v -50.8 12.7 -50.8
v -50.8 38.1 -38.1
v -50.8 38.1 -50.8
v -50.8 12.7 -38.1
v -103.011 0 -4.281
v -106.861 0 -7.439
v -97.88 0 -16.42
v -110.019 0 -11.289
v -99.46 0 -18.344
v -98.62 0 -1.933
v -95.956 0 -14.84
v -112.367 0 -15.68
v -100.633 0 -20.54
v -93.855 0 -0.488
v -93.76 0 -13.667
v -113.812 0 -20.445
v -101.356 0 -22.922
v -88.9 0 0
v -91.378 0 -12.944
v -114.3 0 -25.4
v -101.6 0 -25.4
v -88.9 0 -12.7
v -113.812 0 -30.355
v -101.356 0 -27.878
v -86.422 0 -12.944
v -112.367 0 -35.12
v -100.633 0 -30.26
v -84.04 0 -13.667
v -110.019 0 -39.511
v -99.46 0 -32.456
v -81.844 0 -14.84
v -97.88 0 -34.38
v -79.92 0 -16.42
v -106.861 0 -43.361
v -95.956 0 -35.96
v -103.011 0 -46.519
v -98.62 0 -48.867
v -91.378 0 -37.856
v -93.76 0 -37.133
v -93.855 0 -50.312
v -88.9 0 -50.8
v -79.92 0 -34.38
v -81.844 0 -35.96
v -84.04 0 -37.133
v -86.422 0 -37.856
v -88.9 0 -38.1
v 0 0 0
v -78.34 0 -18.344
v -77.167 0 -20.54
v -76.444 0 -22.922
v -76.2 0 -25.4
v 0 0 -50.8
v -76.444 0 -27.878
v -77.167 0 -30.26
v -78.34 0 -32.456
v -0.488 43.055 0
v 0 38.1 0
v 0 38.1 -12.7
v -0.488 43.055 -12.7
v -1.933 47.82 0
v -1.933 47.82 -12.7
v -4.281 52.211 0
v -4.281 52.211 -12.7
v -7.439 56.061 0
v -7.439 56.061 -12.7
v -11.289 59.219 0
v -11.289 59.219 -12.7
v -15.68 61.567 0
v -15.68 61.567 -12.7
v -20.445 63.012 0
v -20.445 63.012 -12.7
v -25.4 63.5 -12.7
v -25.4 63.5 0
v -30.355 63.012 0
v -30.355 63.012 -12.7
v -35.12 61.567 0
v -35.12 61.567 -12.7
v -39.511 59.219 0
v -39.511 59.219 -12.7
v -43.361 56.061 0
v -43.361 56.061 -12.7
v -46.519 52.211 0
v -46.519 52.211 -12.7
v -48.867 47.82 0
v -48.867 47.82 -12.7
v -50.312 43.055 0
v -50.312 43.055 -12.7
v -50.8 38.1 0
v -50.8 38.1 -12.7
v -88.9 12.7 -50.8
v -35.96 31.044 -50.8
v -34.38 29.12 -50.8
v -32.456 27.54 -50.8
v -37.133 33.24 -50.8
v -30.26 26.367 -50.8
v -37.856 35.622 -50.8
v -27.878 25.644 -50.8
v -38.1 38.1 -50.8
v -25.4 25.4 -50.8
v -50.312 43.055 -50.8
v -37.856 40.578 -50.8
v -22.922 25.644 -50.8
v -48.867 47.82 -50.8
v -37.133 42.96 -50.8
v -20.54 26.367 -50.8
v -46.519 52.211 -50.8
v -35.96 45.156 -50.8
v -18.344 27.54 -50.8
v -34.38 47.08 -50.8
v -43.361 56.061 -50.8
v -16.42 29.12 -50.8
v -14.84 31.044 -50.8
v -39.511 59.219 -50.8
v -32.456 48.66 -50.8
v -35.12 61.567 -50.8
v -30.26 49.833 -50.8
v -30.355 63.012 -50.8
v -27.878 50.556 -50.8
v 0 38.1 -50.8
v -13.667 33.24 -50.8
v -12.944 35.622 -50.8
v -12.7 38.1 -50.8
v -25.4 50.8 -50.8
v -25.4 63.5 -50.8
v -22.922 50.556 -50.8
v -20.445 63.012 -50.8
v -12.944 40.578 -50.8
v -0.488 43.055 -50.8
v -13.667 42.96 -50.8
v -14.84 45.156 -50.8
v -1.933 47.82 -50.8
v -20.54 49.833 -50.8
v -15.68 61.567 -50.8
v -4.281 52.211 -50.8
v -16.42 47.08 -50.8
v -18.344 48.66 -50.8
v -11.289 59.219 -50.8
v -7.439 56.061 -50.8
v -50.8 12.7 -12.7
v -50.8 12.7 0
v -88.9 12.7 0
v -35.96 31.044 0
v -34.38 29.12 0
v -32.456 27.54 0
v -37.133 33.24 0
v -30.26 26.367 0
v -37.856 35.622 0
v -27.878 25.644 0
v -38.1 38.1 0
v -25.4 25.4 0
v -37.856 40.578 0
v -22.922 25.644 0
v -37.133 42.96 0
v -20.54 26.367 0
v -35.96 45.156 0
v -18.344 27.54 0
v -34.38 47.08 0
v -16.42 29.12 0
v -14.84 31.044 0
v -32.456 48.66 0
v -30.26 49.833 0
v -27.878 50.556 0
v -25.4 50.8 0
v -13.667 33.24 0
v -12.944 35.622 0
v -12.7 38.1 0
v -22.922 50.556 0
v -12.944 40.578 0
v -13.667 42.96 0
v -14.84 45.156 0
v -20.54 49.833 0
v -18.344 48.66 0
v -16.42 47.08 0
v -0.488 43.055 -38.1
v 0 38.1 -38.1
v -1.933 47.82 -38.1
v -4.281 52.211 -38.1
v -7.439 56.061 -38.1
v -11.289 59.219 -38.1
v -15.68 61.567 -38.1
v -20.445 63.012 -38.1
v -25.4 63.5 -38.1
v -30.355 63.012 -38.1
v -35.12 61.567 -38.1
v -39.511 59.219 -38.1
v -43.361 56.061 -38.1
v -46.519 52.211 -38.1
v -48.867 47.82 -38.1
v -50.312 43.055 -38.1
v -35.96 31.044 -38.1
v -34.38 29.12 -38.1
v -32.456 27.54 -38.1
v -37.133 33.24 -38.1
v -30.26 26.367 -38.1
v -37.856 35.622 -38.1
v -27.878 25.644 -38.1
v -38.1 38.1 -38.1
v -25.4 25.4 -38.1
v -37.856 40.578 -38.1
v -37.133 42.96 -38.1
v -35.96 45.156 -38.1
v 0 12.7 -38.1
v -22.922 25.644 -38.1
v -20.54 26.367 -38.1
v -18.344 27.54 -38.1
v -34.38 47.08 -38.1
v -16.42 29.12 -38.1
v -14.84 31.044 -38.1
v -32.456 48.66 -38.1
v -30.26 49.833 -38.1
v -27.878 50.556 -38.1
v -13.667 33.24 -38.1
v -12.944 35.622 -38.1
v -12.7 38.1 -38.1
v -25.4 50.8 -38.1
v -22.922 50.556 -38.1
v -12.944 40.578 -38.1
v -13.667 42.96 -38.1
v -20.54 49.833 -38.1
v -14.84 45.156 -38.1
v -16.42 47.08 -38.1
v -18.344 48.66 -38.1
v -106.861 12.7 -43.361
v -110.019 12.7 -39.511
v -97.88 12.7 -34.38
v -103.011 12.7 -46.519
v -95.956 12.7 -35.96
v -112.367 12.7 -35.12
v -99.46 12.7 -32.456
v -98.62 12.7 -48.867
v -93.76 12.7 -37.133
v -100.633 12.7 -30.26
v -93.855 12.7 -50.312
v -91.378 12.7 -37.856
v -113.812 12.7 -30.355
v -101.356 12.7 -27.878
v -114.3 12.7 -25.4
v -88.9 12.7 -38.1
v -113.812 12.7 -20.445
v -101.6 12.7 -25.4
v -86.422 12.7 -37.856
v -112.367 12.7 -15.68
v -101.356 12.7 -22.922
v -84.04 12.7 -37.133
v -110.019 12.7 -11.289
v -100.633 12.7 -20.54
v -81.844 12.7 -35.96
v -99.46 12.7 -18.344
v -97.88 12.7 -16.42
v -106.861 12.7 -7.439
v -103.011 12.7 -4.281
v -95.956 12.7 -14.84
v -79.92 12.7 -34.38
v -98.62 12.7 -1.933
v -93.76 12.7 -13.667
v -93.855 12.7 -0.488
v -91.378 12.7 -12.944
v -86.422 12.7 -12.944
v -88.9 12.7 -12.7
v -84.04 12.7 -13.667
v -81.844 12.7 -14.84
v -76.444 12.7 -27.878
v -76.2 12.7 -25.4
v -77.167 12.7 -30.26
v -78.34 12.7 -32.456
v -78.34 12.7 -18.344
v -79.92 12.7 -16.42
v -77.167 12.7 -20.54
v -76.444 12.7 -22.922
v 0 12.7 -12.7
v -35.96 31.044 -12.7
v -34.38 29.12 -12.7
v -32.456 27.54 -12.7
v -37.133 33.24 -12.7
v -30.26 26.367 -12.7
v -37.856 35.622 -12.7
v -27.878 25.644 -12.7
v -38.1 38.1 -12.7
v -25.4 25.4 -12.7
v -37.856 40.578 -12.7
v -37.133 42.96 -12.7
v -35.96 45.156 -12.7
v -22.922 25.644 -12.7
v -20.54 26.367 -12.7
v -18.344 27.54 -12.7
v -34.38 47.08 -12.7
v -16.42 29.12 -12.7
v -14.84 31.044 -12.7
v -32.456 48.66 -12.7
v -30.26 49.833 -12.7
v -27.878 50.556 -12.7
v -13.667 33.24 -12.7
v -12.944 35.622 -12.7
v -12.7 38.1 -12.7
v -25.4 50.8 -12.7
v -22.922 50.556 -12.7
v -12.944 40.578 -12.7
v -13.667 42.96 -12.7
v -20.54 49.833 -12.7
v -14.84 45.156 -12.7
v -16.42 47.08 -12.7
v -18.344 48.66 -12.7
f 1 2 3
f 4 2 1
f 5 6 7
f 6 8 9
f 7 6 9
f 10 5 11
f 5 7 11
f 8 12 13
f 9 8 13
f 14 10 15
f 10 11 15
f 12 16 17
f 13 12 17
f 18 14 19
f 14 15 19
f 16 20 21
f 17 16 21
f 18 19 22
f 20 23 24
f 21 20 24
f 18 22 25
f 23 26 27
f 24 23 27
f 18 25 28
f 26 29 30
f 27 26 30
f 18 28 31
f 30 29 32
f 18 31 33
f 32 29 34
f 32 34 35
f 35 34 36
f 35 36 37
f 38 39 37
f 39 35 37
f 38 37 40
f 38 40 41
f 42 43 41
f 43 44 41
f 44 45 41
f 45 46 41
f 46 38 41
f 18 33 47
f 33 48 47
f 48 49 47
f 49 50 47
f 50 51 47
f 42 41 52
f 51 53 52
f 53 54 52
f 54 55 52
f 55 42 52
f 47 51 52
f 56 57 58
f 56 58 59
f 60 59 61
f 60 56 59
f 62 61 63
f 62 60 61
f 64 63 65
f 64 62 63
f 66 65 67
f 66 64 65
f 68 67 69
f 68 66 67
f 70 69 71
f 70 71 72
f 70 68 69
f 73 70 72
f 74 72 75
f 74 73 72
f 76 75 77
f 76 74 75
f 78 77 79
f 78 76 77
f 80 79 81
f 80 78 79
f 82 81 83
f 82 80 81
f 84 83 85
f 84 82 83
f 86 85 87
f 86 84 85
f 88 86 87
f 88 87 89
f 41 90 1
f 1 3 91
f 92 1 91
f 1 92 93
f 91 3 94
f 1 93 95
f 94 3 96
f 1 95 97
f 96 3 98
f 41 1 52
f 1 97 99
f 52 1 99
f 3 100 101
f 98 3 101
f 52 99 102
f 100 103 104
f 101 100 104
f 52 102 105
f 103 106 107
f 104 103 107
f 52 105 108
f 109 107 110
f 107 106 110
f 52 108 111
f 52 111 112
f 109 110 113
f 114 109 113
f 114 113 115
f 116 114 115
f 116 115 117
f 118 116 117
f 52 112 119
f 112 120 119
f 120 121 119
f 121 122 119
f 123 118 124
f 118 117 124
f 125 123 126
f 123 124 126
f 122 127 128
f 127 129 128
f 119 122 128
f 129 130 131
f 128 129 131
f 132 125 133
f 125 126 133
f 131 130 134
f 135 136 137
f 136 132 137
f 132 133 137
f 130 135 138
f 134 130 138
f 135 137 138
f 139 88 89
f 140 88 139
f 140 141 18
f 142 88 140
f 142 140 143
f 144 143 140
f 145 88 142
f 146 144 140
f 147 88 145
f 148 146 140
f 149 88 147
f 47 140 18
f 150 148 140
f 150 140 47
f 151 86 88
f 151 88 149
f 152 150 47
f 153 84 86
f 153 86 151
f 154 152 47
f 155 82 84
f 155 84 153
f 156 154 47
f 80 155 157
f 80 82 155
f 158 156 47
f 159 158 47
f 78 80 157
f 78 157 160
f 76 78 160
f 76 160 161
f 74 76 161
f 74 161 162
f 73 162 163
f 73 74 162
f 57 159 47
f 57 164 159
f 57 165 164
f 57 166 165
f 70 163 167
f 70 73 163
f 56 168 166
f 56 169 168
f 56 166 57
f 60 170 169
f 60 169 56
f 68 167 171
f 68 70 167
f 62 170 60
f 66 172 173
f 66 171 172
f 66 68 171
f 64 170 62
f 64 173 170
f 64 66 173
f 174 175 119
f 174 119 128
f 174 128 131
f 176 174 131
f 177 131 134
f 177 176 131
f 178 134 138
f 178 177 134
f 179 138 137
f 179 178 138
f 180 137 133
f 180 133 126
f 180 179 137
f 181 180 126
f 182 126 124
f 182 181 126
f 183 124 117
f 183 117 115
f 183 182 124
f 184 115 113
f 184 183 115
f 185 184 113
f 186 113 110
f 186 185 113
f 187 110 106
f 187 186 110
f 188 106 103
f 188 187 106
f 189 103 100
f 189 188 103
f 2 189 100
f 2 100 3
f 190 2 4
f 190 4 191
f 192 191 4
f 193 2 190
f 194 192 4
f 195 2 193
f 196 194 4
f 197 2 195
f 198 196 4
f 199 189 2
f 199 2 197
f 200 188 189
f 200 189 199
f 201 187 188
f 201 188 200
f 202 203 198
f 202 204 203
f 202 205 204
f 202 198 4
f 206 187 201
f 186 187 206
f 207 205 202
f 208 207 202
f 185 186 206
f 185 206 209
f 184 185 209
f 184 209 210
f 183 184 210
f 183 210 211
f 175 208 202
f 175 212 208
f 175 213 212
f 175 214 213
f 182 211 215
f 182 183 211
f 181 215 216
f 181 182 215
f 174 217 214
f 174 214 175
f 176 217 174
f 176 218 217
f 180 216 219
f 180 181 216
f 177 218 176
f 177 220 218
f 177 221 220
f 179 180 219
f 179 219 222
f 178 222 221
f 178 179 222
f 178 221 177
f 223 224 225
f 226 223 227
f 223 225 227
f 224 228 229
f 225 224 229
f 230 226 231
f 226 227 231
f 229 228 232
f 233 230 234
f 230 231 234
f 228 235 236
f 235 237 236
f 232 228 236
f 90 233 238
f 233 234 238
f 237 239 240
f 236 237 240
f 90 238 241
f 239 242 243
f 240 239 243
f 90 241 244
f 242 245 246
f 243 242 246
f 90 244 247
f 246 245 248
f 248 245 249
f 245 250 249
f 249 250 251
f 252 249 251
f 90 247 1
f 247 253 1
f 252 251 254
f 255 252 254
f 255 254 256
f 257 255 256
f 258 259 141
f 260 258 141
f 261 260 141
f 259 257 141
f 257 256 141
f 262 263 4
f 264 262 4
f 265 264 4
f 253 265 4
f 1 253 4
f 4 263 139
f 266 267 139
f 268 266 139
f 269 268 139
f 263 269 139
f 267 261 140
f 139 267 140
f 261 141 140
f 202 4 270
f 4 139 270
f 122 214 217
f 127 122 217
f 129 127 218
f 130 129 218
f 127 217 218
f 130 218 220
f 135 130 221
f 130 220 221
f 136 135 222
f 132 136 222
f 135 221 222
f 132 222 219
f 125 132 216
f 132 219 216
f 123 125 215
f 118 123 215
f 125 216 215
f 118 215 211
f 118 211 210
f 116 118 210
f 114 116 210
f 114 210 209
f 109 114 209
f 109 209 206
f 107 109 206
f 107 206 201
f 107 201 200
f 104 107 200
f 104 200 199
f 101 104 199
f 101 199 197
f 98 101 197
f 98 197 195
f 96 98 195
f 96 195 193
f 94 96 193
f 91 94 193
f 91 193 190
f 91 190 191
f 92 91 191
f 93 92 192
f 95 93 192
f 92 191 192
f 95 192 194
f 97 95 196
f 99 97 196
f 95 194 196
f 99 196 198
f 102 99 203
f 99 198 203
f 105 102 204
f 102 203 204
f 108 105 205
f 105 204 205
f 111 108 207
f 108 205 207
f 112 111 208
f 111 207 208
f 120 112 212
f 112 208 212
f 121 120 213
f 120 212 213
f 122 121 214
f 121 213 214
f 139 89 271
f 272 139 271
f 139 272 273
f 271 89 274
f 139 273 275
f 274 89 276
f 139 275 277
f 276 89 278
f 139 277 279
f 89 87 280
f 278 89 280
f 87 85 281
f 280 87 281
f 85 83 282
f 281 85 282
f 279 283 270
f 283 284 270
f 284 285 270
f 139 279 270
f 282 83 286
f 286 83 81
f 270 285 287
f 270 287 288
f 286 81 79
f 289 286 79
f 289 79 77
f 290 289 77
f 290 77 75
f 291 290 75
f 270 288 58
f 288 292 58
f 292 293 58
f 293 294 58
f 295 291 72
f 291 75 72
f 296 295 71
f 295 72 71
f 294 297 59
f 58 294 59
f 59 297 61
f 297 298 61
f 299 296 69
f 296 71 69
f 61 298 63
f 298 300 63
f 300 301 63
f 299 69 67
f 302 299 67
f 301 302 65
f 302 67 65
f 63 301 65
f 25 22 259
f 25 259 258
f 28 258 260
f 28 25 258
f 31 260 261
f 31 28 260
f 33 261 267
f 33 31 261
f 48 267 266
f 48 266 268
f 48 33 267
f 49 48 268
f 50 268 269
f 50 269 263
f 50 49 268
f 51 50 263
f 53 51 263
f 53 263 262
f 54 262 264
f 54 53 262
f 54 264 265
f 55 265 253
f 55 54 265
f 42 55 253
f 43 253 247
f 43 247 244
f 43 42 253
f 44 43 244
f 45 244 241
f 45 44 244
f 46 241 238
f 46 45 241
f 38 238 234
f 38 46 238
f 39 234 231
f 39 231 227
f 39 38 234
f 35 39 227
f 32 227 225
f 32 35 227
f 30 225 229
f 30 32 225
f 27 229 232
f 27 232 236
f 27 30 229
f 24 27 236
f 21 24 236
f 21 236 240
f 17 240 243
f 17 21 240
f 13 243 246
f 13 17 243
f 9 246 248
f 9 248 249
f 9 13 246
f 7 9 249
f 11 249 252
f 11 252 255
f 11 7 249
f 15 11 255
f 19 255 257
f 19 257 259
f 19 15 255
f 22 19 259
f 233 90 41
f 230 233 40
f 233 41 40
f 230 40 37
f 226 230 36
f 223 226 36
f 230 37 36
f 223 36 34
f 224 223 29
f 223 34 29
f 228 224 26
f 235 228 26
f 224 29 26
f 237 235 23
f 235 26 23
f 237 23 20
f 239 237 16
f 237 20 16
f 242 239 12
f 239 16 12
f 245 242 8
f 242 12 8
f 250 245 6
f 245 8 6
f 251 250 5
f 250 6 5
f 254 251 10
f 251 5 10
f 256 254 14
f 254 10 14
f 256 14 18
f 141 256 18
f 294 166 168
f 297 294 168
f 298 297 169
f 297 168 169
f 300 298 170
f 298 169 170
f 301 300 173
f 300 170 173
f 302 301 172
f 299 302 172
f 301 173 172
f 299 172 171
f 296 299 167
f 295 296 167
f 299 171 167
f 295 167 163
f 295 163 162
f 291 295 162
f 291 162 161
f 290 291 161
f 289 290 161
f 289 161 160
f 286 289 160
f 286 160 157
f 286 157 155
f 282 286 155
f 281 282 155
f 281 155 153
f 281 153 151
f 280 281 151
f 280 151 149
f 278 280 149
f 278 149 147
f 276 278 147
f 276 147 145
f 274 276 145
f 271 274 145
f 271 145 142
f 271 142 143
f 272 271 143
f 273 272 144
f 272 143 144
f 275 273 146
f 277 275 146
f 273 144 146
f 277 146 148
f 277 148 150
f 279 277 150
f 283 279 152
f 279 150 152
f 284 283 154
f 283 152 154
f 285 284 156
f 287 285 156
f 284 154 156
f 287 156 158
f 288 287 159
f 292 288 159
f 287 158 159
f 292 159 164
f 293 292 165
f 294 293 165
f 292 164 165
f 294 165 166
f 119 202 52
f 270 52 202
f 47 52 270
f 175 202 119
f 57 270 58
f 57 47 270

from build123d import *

# Parameters (mm, degrees)
CROQUIS2_R              = 12.7
SALIENTE_EXTRUIR1_DEPTH = 12.7
CROQUIS4_R              = 12.7
SALIENTE_EXTRUIR4_DEPTH = 50.8
CORTAR_EXTRUIR1_START   = -12.7
CROQUIS4_5_R            = 12.7
CORTAR_EXTRUIR1_DEPTH   = 25.4


with BuildPart() as part:
    # Croquis2 → Saliente-Extruir1 (new body)
    with BuildSketch(Plane(origin=(0, 0, 0), x_dir=(1, 0, 0), z_dir=(0, 1, 0))):
        with BuildLine():
            Line((0, 0), (0, 50.8))
            Line((0, 50.8), (-88.9, 50.8))
            ThreePointArc((-88.9, 50.8), (-114.3, 25.4), (-88.9, 0))
            Line((-88.9, 0), (0, 0))
        make_face()
        with Locations(Location((-88.9, 25.4, 0), (0, 0, 270))):
            Circle(CROQUIS2_R, mode=Mode.SUBTRACT)
    extrude(amount=SALIENTE_EXTRUIR1_DEPTH)

    # Croquis4 → Saliente-Extruir4 (add, through all)
    with BuildSketch(Plane.XY):
        with BuildLine():
            Line((0, 12.7), (0, 38.1))
            ThreePointArc((0, 38.1), (-25.4, 63.5), (-50.8, 38.1))
            Line((-50.8, 38.1), (-50.8, 12.7))
            Line((-50.8, 12.7), (0, 12.7))
        make_face()
        with Locations((-25.4, 38.1)):
            Circle(CROQUIS4_R, mode=Mode.SUBTRACT)
    extrude(amount=-SALIENTE_EXTRUIR4_DEPTH)

    # Croquis4<5> → Cortar-Extruir1 (cut)
    with BuildSketch(Plane.XY.offset(CORTAR_EXTRUIR1_START)):
        with BuildLine():
            Line((0, 12.7), (0, 38.1))
            ThreePointArc((0, 38.1), (-25.4, 63.5), (-50.8, 38.1))
            Line((-50.8, 38.1), (-50.8, 12.7))
            Line((-50.8, 12.7), (0, 12.7))
        make_face()
        with Locations((-25.4, 38.1)):
            Circle(CROQUIS4_5_R, mode=Mode.SUBTRACT)
    extrude(amount=-CORTAR_EXTRUIR1_DEPTH, mode=Mode.SUBTRACT)


solid = part.part
